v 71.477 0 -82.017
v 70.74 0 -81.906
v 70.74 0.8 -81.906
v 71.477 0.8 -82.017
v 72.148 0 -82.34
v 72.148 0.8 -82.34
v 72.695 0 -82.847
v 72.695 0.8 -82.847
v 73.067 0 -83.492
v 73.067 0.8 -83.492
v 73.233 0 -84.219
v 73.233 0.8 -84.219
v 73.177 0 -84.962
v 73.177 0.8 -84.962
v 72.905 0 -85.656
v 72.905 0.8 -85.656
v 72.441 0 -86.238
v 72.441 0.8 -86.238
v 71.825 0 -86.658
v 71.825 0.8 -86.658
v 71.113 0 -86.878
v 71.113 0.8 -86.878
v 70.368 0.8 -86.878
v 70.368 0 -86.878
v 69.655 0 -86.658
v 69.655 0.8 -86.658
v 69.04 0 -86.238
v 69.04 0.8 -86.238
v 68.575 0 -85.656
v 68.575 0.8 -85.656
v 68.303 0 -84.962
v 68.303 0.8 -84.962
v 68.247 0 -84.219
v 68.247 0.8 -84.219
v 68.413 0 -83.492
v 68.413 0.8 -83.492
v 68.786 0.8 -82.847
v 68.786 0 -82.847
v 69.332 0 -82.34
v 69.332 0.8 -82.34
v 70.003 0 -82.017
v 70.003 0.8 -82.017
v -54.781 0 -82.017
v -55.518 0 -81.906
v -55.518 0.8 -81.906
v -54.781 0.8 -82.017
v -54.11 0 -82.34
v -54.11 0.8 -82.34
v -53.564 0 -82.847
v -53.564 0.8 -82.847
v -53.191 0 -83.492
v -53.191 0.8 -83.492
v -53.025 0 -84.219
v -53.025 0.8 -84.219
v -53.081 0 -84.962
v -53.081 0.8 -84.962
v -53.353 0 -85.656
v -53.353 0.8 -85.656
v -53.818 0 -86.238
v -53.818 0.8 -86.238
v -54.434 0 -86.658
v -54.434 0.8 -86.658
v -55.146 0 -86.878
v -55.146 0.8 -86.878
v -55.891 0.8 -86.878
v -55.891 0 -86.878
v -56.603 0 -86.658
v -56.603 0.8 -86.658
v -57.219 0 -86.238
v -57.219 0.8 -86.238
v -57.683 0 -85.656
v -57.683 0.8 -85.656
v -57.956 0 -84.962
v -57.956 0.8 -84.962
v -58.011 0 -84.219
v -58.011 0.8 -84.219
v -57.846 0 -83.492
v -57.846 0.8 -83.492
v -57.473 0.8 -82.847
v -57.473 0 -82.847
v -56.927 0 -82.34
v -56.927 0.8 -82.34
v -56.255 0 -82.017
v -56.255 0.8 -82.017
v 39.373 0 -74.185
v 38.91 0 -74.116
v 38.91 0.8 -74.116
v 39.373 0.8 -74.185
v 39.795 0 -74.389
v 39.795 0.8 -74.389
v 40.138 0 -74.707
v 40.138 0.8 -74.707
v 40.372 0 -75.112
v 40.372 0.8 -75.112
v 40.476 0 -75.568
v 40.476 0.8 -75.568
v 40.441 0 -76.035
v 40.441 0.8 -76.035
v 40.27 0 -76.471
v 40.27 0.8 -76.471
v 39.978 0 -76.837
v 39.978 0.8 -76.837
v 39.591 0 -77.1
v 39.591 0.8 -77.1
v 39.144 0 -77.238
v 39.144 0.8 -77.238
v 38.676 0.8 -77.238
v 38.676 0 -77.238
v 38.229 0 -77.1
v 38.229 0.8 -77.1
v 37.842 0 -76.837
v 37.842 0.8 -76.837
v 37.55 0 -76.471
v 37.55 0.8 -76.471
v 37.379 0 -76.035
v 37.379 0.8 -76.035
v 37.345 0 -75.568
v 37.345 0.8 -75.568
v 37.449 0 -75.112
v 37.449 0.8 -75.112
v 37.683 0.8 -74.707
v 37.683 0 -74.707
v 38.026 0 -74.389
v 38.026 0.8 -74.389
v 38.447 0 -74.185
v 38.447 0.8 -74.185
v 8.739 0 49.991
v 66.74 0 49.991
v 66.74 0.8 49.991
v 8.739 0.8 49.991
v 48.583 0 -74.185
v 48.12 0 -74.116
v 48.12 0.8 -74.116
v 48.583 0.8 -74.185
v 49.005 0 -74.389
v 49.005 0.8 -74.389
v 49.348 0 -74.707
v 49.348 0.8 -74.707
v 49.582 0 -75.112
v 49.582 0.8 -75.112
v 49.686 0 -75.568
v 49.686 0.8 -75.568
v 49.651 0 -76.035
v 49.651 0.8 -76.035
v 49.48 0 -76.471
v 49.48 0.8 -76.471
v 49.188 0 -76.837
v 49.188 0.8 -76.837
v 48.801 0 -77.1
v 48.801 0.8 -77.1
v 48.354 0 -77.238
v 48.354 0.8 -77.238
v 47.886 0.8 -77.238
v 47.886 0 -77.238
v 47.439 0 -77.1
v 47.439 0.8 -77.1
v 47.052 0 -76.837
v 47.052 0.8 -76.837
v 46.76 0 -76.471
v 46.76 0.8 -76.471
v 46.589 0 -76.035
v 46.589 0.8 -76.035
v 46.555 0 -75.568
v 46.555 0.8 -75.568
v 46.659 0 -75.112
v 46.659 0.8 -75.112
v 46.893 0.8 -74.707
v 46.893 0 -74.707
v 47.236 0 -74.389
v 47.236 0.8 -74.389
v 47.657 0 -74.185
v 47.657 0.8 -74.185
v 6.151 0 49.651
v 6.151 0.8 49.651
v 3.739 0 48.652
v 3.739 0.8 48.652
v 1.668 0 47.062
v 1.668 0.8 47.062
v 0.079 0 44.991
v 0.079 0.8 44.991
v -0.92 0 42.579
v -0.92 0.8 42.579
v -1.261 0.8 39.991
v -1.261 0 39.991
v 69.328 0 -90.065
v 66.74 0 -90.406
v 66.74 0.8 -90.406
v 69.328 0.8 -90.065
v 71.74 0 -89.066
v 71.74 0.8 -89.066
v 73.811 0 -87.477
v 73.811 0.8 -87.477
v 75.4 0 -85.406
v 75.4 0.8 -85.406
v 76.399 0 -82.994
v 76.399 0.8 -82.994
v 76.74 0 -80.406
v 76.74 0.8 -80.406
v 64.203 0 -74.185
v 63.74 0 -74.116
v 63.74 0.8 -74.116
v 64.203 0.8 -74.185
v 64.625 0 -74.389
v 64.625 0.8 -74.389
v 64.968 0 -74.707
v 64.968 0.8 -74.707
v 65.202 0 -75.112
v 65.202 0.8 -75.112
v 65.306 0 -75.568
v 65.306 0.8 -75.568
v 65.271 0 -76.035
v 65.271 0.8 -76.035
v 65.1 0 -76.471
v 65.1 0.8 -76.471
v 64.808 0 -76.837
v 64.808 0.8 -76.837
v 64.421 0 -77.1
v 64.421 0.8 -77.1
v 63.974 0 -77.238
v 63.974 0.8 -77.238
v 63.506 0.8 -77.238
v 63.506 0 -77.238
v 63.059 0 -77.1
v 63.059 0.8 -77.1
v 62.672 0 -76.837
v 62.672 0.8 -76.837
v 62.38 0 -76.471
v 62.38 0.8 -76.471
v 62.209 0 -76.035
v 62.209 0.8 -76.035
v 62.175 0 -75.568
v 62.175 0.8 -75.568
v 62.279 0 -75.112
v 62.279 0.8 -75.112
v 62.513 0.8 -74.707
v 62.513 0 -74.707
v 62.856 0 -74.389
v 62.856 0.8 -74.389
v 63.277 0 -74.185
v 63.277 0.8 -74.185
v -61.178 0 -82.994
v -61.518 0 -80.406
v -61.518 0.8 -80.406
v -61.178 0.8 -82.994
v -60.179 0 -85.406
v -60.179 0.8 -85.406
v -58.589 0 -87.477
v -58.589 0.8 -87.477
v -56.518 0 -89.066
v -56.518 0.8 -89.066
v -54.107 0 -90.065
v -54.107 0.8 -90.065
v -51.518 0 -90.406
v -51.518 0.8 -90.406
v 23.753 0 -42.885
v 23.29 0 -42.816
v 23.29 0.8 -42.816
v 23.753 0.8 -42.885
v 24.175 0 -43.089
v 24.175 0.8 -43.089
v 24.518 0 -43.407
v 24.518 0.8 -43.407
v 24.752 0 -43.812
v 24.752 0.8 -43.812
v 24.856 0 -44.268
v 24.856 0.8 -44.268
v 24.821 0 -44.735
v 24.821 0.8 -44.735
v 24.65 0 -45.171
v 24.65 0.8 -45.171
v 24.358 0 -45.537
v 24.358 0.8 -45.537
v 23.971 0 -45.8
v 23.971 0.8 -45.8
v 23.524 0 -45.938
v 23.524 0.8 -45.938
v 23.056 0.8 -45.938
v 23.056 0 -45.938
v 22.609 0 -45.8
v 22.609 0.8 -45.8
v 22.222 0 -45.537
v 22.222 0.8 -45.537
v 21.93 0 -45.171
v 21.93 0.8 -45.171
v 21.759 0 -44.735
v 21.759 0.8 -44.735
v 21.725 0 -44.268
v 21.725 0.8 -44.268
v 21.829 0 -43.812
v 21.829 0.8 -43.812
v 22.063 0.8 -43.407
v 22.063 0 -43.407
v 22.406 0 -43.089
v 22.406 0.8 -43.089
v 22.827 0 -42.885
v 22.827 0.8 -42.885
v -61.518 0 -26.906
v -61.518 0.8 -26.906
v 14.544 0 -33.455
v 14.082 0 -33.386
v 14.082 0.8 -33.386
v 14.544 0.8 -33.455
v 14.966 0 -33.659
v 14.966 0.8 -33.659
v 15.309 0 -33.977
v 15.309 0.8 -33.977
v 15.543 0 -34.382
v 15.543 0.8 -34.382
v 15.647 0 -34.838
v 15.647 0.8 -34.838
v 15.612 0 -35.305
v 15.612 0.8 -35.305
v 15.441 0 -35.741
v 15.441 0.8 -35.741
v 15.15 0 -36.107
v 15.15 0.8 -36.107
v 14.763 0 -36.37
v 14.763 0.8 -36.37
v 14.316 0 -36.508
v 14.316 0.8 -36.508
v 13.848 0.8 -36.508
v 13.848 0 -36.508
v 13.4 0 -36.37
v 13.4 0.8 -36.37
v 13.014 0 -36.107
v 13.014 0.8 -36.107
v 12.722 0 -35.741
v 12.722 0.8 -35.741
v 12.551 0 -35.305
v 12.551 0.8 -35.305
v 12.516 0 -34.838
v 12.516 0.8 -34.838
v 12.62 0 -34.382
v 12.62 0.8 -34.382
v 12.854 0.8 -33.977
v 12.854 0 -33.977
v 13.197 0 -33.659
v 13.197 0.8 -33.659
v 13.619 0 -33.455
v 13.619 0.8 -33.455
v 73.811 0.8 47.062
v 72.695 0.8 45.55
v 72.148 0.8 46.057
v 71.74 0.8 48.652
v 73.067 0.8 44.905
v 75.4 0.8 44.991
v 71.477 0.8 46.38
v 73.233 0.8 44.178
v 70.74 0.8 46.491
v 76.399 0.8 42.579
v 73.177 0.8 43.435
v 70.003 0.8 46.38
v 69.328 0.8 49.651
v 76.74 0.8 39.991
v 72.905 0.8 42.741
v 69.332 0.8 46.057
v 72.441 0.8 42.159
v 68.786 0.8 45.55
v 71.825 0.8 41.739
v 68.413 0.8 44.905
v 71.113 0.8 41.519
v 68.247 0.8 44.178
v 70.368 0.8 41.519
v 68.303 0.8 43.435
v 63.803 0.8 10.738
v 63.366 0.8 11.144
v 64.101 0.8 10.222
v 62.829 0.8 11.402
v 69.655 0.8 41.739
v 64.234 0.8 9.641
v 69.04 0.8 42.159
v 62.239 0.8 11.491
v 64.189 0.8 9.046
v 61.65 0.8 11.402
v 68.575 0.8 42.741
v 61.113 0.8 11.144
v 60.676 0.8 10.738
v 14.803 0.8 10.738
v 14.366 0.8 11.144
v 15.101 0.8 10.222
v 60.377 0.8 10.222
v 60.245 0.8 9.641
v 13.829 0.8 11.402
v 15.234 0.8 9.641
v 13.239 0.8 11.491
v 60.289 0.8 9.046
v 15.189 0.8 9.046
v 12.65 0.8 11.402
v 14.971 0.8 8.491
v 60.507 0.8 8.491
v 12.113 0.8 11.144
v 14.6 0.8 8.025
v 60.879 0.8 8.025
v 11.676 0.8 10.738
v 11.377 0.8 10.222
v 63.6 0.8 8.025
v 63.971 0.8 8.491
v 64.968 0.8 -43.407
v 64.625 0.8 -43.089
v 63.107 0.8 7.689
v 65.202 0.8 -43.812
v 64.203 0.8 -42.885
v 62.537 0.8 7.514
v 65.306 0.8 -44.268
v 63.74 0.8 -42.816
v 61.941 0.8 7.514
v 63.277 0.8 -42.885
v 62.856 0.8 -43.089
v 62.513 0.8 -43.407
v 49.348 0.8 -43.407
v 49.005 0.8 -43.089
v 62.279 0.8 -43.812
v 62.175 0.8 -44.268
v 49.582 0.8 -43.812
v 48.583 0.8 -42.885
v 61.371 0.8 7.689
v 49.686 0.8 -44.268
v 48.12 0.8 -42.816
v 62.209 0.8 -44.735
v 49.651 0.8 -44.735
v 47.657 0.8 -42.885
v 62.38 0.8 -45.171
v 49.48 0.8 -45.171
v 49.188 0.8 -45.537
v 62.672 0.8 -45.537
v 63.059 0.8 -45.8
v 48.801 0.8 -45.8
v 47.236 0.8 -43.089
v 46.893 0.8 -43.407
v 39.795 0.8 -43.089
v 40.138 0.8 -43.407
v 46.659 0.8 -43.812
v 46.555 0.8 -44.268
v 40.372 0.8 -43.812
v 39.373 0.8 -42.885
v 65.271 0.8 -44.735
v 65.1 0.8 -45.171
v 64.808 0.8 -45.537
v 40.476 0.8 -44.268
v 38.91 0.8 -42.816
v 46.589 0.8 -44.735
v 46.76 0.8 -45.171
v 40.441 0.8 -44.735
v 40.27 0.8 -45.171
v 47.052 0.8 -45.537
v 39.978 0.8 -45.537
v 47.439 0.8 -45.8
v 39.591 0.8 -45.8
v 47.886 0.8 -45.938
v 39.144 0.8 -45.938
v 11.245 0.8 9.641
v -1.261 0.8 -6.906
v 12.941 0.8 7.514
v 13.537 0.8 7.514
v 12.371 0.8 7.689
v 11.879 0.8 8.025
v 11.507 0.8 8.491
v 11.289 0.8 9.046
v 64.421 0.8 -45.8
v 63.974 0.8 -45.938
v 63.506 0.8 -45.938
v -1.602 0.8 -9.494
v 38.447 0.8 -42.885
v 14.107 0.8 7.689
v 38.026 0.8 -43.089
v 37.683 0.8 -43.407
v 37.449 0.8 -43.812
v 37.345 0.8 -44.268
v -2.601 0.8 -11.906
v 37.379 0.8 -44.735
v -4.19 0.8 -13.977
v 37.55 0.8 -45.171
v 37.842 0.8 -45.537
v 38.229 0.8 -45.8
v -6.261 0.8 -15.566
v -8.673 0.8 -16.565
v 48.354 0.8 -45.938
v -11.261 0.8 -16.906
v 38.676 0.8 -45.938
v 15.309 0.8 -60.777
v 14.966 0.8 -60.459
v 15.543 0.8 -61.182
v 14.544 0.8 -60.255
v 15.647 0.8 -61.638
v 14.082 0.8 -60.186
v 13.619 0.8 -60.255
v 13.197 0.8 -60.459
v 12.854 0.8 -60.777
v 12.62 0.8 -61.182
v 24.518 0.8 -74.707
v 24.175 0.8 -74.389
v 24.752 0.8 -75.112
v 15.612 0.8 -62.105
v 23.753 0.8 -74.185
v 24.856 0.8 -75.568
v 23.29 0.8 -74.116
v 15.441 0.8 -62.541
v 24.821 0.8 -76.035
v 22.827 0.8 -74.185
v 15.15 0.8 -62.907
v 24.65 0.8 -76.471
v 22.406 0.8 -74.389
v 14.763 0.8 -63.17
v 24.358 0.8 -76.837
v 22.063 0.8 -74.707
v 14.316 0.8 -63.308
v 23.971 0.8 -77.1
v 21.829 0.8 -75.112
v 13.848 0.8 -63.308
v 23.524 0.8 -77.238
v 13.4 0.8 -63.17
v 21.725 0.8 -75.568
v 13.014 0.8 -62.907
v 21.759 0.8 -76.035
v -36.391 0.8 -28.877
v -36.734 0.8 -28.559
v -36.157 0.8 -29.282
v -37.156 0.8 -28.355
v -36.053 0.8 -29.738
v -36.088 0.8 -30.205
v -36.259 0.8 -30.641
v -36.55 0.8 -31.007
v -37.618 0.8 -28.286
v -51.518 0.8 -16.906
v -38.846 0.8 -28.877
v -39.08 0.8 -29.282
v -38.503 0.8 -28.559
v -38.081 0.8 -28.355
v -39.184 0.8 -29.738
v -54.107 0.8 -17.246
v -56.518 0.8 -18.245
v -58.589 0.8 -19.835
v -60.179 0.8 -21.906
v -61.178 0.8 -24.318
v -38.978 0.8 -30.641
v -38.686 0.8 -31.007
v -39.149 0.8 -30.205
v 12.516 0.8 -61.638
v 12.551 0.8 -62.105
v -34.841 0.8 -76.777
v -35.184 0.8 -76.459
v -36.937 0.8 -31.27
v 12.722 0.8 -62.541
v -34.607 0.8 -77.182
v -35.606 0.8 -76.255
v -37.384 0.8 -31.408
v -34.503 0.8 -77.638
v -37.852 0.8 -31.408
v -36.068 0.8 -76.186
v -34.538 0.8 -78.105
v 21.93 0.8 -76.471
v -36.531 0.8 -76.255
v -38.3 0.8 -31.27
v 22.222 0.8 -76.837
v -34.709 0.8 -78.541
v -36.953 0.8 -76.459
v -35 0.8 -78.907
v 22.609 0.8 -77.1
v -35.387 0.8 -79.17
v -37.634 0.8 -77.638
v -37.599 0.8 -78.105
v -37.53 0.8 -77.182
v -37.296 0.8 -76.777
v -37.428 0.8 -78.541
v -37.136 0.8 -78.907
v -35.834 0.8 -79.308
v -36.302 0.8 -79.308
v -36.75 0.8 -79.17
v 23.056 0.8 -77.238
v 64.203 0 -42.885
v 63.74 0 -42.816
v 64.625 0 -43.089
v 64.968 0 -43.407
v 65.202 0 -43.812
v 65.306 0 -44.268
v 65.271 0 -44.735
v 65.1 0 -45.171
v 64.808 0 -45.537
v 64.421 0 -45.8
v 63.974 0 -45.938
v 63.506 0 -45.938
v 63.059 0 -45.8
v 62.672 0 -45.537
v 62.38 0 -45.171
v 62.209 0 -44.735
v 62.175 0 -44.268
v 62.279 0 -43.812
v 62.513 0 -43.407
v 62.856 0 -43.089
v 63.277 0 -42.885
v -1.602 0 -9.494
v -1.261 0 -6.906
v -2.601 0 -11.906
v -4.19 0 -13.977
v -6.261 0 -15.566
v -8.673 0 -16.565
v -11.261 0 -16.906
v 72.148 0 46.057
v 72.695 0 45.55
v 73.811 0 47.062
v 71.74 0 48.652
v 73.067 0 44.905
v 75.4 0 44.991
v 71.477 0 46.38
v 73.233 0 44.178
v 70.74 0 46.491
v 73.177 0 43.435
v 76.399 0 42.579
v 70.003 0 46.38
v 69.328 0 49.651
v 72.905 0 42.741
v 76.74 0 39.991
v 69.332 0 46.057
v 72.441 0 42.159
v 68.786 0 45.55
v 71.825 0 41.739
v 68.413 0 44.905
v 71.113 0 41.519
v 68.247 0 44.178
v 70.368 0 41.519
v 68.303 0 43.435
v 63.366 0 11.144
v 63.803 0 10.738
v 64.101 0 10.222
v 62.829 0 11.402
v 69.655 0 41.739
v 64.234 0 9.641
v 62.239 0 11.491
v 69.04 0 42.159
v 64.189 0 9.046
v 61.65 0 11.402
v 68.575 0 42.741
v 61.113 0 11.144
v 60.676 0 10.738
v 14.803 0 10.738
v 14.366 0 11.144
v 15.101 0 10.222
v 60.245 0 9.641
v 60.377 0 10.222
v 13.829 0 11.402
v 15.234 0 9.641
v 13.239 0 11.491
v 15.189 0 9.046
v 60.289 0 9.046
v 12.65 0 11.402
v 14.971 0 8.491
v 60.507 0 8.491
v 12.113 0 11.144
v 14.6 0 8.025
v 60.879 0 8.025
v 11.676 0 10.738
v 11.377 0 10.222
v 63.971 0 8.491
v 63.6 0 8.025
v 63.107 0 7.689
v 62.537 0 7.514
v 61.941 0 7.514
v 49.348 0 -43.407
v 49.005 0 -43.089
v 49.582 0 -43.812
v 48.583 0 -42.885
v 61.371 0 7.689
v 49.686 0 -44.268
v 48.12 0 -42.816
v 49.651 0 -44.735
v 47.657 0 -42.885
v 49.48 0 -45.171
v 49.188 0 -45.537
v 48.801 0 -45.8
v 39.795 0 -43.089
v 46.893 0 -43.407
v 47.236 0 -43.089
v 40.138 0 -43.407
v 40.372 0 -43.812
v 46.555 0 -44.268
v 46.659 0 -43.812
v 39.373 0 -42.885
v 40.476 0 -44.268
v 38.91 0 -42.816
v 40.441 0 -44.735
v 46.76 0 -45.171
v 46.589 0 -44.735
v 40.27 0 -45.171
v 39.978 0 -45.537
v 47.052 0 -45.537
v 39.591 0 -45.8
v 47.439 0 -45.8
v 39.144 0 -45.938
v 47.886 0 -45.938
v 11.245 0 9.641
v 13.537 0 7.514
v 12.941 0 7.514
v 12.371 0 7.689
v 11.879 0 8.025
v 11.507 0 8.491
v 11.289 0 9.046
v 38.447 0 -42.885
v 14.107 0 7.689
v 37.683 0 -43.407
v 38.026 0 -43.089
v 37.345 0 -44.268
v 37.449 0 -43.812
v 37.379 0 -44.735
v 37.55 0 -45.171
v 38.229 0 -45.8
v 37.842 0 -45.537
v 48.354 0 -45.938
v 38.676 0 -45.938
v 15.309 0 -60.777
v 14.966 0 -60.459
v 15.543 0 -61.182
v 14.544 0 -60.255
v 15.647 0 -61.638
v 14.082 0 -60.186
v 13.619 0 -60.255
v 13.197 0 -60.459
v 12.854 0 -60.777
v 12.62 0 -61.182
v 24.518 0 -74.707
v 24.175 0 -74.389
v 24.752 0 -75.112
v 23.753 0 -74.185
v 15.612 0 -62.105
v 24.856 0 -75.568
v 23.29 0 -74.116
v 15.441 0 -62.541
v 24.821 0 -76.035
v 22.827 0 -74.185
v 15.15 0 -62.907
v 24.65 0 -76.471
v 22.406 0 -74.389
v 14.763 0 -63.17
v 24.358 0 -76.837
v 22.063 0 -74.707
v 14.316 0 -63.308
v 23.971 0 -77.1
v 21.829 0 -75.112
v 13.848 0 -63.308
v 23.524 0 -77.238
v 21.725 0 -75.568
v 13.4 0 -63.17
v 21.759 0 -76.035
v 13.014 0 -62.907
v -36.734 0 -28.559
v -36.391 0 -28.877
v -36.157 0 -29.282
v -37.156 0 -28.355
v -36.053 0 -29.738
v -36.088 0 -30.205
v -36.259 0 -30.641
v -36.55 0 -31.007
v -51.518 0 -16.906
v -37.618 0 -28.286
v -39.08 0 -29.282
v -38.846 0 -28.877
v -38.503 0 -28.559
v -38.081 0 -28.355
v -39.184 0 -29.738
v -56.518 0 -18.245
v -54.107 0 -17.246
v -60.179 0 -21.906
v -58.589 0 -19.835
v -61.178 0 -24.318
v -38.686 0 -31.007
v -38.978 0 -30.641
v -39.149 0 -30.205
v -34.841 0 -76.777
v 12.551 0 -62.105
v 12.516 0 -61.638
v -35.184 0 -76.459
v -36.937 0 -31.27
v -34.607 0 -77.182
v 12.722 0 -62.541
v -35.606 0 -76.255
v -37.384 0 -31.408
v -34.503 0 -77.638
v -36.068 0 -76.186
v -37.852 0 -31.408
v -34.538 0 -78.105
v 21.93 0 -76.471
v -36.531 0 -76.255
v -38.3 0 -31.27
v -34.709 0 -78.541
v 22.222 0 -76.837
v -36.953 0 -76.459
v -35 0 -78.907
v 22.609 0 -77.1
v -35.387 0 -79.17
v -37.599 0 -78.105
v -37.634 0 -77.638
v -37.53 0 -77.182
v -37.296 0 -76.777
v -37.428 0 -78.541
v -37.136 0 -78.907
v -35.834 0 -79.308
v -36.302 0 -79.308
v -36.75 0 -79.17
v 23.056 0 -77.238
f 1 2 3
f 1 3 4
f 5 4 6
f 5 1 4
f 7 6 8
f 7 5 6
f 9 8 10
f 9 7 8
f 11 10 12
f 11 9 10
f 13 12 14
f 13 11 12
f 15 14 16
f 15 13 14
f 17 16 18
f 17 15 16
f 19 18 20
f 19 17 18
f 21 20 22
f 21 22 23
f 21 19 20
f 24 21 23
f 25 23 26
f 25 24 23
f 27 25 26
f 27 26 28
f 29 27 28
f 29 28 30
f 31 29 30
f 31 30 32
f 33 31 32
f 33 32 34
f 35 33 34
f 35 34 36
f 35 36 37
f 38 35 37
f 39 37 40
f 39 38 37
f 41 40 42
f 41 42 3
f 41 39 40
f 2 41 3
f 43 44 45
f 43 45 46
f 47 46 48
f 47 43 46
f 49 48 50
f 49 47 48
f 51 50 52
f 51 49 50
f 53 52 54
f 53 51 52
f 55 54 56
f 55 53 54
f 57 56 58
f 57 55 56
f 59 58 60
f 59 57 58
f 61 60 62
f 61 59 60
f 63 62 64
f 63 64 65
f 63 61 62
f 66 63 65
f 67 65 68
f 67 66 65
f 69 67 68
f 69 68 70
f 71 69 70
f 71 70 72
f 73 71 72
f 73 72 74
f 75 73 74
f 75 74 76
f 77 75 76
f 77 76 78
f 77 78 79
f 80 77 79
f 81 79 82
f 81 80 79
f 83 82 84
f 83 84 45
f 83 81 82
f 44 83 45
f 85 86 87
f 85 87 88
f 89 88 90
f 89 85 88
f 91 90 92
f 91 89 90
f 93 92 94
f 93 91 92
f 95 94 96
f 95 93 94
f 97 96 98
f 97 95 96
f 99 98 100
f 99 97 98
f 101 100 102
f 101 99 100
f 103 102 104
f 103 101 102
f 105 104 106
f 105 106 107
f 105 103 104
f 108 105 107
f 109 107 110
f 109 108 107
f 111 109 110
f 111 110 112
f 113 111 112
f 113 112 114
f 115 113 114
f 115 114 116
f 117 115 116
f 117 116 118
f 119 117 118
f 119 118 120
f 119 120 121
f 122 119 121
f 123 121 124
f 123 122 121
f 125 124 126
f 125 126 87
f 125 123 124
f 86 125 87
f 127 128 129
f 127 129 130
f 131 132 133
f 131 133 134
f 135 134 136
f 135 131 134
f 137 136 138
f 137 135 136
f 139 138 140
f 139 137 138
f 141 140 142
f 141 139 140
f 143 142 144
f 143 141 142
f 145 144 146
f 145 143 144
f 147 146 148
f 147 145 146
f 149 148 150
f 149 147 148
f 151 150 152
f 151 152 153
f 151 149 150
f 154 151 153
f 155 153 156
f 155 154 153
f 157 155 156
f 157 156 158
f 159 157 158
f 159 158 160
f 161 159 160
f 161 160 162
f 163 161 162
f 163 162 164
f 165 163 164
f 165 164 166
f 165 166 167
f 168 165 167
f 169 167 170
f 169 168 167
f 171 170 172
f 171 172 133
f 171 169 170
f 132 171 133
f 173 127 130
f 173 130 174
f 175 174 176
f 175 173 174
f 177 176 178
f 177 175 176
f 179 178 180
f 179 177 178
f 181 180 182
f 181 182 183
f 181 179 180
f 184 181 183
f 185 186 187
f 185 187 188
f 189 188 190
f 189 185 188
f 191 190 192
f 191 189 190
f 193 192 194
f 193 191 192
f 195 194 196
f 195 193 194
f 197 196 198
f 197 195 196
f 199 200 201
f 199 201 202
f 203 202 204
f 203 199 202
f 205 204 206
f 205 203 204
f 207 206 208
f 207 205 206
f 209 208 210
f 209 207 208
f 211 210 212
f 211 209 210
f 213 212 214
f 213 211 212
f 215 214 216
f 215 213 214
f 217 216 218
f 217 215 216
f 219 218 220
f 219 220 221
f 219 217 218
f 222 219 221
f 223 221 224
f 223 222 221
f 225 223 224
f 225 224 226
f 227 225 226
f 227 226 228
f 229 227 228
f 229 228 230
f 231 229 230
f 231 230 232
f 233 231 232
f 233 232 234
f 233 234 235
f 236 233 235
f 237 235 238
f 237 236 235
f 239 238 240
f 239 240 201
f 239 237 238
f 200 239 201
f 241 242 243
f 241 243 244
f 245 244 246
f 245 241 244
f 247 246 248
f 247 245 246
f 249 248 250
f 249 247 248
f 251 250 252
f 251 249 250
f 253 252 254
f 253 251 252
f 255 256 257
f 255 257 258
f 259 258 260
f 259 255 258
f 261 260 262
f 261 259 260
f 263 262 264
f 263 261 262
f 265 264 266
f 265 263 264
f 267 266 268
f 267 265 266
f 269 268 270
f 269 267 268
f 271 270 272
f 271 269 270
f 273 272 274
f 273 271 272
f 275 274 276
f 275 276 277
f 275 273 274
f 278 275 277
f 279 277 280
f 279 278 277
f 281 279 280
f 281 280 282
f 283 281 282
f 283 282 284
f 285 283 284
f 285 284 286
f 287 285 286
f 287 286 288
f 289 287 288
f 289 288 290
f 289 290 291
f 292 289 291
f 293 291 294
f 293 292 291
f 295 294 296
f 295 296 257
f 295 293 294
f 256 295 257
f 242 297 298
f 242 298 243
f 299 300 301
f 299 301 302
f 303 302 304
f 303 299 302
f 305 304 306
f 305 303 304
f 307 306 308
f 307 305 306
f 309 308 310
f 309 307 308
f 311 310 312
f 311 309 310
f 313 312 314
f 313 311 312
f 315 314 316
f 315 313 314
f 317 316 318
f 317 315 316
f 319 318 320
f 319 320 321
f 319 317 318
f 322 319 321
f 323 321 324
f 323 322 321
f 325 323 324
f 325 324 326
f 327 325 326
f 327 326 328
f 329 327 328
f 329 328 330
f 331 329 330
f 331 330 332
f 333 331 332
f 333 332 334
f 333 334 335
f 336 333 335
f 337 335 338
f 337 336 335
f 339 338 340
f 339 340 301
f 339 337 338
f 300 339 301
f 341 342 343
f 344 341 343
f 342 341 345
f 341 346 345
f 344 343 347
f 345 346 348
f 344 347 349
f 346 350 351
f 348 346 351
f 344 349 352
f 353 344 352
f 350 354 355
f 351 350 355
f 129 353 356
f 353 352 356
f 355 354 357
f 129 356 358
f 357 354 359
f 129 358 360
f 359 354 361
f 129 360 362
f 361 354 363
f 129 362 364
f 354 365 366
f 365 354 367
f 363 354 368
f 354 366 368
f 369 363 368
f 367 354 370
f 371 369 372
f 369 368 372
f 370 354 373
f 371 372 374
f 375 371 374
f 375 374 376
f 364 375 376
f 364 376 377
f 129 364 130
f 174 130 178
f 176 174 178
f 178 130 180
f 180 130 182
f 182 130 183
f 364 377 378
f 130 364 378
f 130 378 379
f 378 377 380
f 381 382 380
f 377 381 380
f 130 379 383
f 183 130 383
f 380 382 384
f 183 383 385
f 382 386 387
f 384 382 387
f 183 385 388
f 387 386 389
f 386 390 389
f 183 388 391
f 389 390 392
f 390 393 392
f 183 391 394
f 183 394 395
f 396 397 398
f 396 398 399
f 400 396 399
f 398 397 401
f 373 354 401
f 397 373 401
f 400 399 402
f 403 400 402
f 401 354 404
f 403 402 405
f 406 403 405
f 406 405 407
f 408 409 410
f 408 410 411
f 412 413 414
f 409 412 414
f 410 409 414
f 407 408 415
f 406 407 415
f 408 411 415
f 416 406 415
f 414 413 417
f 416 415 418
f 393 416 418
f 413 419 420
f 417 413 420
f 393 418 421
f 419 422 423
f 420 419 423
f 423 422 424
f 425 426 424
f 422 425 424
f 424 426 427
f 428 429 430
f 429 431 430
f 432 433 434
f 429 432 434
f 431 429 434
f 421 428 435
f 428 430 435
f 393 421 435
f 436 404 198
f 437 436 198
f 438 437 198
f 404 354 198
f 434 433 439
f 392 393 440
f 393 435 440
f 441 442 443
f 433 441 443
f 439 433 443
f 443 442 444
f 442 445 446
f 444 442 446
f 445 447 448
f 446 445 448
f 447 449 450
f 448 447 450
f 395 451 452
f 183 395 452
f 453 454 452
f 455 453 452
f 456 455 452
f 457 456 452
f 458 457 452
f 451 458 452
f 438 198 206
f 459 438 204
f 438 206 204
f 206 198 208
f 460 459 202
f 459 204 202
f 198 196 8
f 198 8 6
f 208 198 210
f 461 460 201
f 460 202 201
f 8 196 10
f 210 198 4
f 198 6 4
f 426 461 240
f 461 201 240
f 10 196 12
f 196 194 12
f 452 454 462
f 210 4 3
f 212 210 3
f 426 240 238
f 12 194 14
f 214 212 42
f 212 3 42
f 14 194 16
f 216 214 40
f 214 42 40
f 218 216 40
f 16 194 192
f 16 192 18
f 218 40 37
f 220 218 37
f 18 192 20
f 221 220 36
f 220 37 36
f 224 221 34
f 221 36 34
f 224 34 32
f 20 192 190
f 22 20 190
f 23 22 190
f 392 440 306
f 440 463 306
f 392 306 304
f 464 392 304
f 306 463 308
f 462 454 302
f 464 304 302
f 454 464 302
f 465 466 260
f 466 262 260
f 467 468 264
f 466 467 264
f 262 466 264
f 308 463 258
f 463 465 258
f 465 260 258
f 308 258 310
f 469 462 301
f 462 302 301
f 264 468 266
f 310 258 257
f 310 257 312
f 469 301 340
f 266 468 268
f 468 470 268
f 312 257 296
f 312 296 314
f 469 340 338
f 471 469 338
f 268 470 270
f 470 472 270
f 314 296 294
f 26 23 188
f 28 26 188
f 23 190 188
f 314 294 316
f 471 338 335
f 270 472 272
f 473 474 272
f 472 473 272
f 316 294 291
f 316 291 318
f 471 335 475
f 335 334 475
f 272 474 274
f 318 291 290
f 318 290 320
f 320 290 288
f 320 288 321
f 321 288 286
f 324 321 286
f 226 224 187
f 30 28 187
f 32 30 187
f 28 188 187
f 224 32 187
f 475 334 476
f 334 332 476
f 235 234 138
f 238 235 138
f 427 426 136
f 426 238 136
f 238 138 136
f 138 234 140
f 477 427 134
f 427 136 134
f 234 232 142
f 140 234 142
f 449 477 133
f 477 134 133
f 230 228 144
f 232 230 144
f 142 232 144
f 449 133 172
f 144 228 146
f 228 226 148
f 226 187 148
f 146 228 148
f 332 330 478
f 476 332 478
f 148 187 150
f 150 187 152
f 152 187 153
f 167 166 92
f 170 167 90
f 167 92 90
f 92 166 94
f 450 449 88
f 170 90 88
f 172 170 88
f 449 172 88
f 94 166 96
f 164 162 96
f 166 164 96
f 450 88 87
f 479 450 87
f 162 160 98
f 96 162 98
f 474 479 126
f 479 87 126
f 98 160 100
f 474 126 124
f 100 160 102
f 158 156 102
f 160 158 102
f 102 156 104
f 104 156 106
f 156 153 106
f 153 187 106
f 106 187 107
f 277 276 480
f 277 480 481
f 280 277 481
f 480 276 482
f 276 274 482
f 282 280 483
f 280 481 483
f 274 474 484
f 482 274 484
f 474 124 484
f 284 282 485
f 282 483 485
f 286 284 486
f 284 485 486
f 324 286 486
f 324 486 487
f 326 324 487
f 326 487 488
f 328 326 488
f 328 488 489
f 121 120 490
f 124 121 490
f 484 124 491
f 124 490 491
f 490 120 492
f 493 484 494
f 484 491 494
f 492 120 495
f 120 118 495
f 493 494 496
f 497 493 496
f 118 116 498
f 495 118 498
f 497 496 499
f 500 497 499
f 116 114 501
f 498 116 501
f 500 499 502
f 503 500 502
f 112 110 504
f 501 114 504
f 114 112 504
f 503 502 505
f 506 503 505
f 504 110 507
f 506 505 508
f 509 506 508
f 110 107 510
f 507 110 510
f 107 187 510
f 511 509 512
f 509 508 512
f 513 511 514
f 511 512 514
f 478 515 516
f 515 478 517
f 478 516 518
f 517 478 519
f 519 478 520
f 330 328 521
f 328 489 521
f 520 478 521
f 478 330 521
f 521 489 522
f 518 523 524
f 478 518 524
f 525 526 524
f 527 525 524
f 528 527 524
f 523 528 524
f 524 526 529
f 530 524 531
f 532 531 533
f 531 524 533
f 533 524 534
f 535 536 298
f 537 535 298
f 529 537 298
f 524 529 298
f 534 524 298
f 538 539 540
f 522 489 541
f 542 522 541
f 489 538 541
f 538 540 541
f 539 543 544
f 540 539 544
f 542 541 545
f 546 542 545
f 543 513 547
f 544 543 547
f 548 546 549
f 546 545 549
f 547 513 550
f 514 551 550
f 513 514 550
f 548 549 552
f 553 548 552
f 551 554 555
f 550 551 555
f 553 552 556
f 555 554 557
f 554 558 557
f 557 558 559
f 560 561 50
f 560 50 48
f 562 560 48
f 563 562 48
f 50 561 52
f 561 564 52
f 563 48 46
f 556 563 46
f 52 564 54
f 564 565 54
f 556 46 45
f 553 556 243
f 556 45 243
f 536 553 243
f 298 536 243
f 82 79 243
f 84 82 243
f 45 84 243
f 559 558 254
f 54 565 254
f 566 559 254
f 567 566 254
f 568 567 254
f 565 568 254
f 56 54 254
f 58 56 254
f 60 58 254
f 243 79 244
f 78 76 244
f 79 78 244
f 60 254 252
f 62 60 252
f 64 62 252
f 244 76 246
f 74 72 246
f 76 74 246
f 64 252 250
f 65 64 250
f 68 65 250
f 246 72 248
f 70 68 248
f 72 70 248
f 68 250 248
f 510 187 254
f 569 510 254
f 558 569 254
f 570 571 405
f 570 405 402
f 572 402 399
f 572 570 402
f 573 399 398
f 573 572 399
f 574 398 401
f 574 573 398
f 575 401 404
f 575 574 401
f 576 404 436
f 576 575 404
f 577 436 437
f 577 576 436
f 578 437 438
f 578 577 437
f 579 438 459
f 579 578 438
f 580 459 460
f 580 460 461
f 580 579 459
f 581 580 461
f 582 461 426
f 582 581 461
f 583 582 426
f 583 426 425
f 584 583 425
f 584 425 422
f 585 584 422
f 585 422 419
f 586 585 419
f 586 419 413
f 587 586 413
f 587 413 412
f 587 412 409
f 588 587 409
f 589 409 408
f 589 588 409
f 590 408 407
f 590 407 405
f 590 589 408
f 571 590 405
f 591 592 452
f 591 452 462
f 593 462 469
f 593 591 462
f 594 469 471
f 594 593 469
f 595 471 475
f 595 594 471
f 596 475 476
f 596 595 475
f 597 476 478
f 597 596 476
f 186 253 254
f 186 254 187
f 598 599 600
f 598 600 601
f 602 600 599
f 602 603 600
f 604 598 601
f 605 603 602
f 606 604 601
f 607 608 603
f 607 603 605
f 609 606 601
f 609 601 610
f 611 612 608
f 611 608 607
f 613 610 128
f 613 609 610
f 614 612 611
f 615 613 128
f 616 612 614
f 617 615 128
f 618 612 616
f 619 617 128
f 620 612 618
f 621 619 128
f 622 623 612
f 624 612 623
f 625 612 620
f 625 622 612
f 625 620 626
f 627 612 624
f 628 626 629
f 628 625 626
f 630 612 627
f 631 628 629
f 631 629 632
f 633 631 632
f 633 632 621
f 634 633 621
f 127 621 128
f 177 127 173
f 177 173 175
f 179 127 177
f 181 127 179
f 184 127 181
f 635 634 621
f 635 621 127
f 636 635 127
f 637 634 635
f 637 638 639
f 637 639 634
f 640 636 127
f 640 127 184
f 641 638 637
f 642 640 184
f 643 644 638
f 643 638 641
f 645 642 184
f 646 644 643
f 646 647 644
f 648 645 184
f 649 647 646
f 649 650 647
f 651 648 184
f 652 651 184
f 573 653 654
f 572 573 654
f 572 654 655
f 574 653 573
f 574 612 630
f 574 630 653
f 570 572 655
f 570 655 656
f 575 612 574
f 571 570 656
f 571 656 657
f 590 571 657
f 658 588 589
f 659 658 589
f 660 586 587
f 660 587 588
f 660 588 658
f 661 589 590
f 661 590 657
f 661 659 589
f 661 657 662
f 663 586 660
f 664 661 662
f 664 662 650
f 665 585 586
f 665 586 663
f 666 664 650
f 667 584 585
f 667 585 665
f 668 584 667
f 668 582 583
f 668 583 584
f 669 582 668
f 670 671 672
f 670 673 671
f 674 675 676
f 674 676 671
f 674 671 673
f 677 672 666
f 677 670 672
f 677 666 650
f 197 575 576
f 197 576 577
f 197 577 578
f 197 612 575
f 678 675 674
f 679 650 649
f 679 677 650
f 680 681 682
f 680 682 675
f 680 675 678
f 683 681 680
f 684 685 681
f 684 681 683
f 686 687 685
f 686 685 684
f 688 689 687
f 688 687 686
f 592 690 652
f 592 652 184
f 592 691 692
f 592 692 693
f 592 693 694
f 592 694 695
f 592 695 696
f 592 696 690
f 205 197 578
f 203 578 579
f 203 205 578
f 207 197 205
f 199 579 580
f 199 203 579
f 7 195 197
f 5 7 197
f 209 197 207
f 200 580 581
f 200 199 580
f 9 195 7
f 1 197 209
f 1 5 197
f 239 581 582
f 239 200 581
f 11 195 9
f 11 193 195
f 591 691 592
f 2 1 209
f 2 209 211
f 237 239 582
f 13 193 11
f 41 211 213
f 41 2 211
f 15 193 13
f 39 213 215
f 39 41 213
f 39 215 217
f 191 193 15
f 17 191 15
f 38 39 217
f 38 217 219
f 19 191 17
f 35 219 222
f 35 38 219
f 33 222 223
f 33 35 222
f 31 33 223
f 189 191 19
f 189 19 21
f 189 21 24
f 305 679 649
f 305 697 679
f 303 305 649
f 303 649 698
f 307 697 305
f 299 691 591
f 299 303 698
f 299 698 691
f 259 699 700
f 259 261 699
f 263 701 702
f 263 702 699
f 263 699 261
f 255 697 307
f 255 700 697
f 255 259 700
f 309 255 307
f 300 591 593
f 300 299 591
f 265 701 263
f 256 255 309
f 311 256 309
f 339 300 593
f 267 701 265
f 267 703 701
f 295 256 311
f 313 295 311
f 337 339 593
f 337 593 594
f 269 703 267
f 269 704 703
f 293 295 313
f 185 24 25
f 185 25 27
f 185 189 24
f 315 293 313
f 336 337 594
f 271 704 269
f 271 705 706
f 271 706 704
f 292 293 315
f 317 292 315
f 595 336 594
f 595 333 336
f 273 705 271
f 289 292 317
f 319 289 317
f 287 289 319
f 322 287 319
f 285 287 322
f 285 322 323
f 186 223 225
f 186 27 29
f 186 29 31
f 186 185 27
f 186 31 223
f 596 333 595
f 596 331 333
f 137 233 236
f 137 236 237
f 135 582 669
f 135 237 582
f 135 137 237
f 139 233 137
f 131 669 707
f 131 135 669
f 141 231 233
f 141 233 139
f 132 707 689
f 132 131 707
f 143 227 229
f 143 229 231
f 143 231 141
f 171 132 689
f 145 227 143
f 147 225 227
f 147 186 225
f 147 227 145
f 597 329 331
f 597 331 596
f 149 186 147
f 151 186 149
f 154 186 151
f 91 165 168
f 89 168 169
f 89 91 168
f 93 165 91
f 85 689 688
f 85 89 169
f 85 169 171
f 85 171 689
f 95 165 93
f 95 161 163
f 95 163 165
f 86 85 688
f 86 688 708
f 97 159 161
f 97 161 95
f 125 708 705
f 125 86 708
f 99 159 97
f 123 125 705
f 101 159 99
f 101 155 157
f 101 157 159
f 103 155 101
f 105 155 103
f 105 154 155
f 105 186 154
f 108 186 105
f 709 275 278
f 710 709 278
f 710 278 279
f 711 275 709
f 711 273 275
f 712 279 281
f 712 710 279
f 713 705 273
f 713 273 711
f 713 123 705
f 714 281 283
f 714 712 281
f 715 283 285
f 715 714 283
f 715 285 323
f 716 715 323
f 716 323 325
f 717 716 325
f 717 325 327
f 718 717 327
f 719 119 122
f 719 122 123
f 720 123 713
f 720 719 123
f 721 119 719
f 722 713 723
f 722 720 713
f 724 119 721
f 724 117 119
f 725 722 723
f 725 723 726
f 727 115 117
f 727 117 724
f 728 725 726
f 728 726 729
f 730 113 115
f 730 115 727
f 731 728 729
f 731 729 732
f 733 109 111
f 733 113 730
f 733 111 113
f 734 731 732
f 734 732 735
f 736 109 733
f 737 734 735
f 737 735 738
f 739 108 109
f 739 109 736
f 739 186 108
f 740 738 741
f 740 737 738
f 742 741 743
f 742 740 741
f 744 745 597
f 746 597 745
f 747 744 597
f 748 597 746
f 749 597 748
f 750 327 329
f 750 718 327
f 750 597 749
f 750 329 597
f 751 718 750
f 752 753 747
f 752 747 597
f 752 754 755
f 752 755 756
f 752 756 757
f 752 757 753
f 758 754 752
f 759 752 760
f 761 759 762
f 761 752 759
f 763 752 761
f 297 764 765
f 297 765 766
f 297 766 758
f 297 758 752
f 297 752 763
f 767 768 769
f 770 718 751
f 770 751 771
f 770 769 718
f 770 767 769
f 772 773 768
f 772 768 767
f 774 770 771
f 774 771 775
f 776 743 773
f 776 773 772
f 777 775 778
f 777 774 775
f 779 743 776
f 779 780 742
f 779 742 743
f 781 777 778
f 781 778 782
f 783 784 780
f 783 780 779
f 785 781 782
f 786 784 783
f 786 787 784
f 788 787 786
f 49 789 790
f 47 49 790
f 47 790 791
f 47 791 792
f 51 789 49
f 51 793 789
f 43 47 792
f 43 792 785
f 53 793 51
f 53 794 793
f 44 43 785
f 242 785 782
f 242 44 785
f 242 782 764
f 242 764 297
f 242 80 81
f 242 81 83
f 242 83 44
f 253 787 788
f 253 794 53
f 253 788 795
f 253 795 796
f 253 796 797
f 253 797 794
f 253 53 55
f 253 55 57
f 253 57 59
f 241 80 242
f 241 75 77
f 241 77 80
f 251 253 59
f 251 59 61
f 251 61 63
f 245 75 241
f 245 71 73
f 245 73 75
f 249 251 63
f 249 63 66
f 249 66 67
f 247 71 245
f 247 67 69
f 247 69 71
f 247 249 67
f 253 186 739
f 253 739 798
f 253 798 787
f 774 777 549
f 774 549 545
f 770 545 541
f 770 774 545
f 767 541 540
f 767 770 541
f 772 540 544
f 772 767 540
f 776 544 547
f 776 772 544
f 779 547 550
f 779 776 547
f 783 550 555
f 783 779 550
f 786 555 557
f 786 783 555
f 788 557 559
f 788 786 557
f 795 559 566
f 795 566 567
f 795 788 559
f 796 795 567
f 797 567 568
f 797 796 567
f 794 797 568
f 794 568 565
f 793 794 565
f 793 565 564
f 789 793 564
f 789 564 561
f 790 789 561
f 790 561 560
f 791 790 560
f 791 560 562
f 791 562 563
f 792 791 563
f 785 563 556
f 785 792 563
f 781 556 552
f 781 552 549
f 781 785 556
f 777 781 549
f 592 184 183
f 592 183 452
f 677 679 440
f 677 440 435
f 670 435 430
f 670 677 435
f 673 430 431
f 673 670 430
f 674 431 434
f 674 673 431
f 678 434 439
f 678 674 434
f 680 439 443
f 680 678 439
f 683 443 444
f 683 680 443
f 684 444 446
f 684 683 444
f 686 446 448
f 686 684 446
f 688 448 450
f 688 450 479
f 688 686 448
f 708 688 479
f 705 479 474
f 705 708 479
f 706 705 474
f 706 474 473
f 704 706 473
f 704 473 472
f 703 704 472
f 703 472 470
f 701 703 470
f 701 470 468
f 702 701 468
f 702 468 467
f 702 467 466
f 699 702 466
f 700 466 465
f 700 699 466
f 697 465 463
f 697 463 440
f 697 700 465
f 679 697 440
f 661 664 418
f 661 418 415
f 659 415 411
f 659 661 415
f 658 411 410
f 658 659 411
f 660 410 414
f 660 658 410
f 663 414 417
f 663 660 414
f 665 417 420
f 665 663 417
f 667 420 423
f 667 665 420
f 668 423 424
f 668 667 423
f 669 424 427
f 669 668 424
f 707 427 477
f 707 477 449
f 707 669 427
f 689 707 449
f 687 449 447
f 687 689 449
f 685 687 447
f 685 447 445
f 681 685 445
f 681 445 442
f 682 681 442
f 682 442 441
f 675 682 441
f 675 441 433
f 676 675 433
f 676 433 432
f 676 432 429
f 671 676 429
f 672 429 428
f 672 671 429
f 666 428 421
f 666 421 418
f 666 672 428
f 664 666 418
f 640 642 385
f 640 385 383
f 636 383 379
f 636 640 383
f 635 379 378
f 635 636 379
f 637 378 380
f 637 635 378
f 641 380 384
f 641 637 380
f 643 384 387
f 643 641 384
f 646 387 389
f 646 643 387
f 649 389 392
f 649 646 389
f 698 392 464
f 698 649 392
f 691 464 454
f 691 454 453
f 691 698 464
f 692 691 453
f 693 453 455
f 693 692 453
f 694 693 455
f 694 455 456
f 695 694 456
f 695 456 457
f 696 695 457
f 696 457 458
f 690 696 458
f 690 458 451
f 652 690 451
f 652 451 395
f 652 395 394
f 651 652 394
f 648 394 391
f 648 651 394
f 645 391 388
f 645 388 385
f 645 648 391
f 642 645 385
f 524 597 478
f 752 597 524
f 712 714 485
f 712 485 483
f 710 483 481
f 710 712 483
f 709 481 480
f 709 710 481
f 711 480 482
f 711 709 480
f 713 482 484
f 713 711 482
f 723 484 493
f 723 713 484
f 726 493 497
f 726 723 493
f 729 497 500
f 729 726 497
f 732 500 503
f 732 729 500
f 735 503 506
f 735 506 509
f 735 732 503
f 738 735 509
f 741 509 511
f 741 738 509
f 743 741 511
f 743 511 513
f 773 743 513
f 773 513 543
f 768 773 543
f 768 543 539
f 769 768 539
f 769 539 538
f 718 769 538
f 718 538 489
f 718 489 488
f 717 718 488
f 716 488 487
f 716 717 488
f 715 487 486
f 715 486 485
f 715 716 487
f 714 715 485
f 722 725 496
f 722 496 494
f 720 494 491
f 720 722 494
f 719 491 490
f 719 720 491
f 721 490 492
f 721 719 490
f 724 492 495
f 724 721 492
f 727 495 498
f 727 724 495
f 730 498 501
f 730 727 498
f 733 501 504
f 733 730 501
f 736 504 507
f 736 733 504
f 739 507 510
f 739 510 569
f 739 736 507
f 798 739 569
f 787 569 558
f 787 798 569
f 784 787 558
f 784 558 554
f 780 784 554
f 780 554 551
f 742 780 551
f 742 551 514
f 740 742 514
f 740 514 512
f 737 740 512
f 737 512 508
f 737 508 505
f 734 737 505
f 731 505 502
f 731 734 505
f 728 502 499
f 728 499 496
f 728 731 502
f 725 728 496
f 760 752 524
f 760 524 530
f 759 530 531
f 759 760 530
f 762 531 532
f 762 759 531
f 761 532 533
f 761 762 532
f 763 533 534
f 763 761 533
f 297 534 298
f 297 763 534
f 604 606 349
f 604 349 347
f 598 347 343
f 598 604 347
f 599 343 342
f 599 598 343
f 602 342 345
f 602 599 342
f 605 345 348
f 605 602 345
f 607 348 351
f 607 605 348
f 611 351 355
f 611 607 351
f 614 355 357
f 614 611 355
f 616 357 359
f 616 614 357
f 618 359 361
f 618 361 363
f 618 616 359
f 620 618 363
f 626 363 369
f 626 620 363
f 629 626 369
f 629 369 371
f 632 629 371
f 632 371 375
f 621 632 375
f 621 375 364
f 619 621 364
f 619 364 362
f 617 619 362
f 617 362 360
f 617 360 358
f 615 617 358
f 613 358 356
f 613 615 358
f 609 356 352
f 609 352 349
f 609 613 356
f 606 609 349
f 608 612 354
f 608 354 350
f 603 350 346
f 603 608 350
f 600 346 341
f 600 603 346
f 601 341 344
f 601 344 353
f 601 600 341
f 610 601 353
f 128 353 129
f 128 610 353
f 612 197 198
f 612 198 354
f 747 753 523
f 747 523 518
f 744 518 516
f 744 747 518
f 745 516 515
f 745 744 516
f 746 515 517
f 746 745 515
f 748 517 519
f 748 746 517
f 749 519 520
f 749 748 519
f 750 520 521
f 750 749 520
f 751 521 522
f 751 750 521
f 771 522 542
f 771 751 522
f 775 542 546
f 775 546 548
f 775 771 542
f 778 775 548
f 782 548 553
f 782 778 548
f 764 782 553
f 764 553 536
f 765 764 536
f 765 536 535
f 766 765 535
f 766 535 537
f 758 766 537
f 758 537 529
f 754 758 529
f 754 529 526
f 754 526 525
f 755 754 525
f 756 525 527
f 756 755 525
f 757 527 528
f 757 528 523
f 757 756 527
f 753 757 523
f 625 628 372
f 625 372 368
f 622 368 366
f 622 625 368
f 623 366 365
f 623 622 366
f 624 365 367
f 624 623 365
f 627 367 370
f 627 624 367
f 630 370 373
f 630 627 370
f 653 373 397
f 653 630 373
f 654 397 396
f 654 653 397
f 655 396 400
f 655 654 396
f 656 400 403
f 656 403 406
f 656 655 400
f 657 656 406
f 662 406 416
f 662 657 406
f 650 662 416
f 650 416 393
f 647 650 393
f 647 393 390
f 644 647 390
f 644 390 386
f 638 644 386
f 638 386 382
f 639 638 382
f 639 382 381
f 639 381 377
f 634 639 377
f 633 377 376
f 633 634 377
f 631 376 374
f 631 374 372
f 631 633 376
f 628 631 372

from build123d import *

# Parameters (mm, degrees)
SKETCH_1_R      = 1.57
SKETCH_1_R_2    = 2
SKETCH_1_R_3    = 2.5
EXTRUDE_1_DEPTH = 0.8


with BuildPart() as part:
    # 草图1 → 凸台-拉伸1 (new body)
    with BuildSketch(Plane(origin=(0, 0, 0), x_dir=(1, 0, 0), z_dir=(0, 1, 0))):
        with BuildLine():
            Line((-51.518366865, 90.405716602), (66.740135943, 90.405716602))
            ThreePointArc((66.740135943, 90.405716602), (73.811203755, 87.476784413), (76.740135943, 80.405716602))
            Line((76.740135943, 80.405716602), (76.740135943, 30.195483944))
            Line((76.740135943, 30.195483944), (76.740135943, -39.991264165))
            ThreePointArc((76.740135943, -39.991264165), (73.811203755, -47.062331977), (66.740135943, -49.991264165))
            Line((66.740135943, -49.991264165), (35.120135943, -49.991264165))
            Line((35.120135943, -49.991264165), (8.739202574, -49.991264165))
            ThreePointArc((8.739202574, -49.991264165), (1.668134763, -47.062331977), (-1.260797426, -39.991264165))
            Line((-1.260797426, -39.991264165), (-1.260797426, 6.905716602))
            ThreePointArc((-1.260797426, 6.905716602), (-4.189729614, 13.976784413), (-11.260797426, 16.905716602))
            Line((-11.260797426, 16.905716602), (-51.518366865, 16.905716602))
            ThreePointArc((-51.518366865, 16.905716602), (-58.589434677, 19.83464879), (-61.518366865, 26.905716602))
            Line((-61.518366865, 26.905716602), (-61.518366865, 80.405716602))
            ThreePointArc((-61.518366865, 80.405716602), (-58.589434677, 87.476784413), (-51.518366865, 90.405716602))
        make_face()
        with Locations(Location((-36.068366865, 77.755716602, 0), (0, 0, 270))):
            Circle(SKETCH_1_R, mode=Mode.SUBTRACT)
        with Locations(Location((23.290135943, 75.685716602, 0), (0, 0, 270))):
            Circle(SKETCH_1_R, mode=Mode.SUBTRACT)
        with Locations(Location((38.910135943, 75.685716602, 0), (0, 0, 270))):
            Circle(SKETCH_1_R, mode=Mode.SUBTRACT)
        with Locations(Location((48.120135943, 75.685716602, 0), (0, 0, 270))):
            Circle(SKETCH_1_R, mode=Mode.SUBTRACT)
        with Locations(Location((63.740135943, 75.685716602, 0), (0, 0, 270))):
            Circle(SKETCH_1_R, mode=Mode.SUBTRACT)
        with Locations(Location((-37.618366865, 29.855716602, 0), (0, 0, 270))):
            Circle(SKETCH_1_R, mode=Mode.SUBTRACT)
        with Locations(Location((14.081633135, 34.955716602, 0), (0, 0, 270))):
            Circle(SKETCH_1_R, mode=Mode.SUBTRACT)
        with Locations(Location((14.081633135, 61.755716602, 0), (0, 0, 270))):
            Circle(SKETCH_1_R, mode=Mode.SUBTRACT)
        with Locations(Location((23.290135943, 44.385716602, 0), (0, 0, 270))):
            Circle(SKETCH_1_R, mode=Mode.SUBTRACT)
        with Locations(Location((38.910135943, 44.385716602, 0), (0, 0, 270))):
            Circle(SKETCH_1_R, mode=Mode.SUBTRACT)
        with Locations(Location((48.120135943, 44.385716602, 0), (0, 0, 270))):
            Circle(SKETCH_1_R, mode=Mode.SUBTRACT)
        with Locations(Location((63.740135943, 44.385716602, 0), (0, 0, 270))):
            Circle(SKETCH_1_R, mode=Mode.SUBTRACT)
        with Locations(Location((13.239202574, -9.491264165, 0), (0, 0, 270))):
            Circle(SKETCH_1_R_2, mode=Mode.SUBTRACT)
        with Locations(Location((62.239202574, -9.491264165, 0), (0, 0, 270))):
            Circle(SKETCH_1_R_2, mode=Mode.SUBTRACT)
        with Locations(Location((-55.518366865, 84.405716602, 0), (0, 0, 270))):
            Circle(SKETCH_1_R_3, mode=Mode.SUBTRACT)
        with Locations(Location((70.740135943, 84.405716602, 0), (0, 0, 270))):
            Circle(SKETCH_1_R_3, mode=Mode.SUBTRACT)
        with Locations(Location((70.740135943, -43.991264165, 0), (0, 0, 270))):
            Circle(SKETCH_1_R_3, mode=Mode.SUBTRACT)
    extrude(amount=EXTRUDE_1_DEPTH)


solid = part.part
